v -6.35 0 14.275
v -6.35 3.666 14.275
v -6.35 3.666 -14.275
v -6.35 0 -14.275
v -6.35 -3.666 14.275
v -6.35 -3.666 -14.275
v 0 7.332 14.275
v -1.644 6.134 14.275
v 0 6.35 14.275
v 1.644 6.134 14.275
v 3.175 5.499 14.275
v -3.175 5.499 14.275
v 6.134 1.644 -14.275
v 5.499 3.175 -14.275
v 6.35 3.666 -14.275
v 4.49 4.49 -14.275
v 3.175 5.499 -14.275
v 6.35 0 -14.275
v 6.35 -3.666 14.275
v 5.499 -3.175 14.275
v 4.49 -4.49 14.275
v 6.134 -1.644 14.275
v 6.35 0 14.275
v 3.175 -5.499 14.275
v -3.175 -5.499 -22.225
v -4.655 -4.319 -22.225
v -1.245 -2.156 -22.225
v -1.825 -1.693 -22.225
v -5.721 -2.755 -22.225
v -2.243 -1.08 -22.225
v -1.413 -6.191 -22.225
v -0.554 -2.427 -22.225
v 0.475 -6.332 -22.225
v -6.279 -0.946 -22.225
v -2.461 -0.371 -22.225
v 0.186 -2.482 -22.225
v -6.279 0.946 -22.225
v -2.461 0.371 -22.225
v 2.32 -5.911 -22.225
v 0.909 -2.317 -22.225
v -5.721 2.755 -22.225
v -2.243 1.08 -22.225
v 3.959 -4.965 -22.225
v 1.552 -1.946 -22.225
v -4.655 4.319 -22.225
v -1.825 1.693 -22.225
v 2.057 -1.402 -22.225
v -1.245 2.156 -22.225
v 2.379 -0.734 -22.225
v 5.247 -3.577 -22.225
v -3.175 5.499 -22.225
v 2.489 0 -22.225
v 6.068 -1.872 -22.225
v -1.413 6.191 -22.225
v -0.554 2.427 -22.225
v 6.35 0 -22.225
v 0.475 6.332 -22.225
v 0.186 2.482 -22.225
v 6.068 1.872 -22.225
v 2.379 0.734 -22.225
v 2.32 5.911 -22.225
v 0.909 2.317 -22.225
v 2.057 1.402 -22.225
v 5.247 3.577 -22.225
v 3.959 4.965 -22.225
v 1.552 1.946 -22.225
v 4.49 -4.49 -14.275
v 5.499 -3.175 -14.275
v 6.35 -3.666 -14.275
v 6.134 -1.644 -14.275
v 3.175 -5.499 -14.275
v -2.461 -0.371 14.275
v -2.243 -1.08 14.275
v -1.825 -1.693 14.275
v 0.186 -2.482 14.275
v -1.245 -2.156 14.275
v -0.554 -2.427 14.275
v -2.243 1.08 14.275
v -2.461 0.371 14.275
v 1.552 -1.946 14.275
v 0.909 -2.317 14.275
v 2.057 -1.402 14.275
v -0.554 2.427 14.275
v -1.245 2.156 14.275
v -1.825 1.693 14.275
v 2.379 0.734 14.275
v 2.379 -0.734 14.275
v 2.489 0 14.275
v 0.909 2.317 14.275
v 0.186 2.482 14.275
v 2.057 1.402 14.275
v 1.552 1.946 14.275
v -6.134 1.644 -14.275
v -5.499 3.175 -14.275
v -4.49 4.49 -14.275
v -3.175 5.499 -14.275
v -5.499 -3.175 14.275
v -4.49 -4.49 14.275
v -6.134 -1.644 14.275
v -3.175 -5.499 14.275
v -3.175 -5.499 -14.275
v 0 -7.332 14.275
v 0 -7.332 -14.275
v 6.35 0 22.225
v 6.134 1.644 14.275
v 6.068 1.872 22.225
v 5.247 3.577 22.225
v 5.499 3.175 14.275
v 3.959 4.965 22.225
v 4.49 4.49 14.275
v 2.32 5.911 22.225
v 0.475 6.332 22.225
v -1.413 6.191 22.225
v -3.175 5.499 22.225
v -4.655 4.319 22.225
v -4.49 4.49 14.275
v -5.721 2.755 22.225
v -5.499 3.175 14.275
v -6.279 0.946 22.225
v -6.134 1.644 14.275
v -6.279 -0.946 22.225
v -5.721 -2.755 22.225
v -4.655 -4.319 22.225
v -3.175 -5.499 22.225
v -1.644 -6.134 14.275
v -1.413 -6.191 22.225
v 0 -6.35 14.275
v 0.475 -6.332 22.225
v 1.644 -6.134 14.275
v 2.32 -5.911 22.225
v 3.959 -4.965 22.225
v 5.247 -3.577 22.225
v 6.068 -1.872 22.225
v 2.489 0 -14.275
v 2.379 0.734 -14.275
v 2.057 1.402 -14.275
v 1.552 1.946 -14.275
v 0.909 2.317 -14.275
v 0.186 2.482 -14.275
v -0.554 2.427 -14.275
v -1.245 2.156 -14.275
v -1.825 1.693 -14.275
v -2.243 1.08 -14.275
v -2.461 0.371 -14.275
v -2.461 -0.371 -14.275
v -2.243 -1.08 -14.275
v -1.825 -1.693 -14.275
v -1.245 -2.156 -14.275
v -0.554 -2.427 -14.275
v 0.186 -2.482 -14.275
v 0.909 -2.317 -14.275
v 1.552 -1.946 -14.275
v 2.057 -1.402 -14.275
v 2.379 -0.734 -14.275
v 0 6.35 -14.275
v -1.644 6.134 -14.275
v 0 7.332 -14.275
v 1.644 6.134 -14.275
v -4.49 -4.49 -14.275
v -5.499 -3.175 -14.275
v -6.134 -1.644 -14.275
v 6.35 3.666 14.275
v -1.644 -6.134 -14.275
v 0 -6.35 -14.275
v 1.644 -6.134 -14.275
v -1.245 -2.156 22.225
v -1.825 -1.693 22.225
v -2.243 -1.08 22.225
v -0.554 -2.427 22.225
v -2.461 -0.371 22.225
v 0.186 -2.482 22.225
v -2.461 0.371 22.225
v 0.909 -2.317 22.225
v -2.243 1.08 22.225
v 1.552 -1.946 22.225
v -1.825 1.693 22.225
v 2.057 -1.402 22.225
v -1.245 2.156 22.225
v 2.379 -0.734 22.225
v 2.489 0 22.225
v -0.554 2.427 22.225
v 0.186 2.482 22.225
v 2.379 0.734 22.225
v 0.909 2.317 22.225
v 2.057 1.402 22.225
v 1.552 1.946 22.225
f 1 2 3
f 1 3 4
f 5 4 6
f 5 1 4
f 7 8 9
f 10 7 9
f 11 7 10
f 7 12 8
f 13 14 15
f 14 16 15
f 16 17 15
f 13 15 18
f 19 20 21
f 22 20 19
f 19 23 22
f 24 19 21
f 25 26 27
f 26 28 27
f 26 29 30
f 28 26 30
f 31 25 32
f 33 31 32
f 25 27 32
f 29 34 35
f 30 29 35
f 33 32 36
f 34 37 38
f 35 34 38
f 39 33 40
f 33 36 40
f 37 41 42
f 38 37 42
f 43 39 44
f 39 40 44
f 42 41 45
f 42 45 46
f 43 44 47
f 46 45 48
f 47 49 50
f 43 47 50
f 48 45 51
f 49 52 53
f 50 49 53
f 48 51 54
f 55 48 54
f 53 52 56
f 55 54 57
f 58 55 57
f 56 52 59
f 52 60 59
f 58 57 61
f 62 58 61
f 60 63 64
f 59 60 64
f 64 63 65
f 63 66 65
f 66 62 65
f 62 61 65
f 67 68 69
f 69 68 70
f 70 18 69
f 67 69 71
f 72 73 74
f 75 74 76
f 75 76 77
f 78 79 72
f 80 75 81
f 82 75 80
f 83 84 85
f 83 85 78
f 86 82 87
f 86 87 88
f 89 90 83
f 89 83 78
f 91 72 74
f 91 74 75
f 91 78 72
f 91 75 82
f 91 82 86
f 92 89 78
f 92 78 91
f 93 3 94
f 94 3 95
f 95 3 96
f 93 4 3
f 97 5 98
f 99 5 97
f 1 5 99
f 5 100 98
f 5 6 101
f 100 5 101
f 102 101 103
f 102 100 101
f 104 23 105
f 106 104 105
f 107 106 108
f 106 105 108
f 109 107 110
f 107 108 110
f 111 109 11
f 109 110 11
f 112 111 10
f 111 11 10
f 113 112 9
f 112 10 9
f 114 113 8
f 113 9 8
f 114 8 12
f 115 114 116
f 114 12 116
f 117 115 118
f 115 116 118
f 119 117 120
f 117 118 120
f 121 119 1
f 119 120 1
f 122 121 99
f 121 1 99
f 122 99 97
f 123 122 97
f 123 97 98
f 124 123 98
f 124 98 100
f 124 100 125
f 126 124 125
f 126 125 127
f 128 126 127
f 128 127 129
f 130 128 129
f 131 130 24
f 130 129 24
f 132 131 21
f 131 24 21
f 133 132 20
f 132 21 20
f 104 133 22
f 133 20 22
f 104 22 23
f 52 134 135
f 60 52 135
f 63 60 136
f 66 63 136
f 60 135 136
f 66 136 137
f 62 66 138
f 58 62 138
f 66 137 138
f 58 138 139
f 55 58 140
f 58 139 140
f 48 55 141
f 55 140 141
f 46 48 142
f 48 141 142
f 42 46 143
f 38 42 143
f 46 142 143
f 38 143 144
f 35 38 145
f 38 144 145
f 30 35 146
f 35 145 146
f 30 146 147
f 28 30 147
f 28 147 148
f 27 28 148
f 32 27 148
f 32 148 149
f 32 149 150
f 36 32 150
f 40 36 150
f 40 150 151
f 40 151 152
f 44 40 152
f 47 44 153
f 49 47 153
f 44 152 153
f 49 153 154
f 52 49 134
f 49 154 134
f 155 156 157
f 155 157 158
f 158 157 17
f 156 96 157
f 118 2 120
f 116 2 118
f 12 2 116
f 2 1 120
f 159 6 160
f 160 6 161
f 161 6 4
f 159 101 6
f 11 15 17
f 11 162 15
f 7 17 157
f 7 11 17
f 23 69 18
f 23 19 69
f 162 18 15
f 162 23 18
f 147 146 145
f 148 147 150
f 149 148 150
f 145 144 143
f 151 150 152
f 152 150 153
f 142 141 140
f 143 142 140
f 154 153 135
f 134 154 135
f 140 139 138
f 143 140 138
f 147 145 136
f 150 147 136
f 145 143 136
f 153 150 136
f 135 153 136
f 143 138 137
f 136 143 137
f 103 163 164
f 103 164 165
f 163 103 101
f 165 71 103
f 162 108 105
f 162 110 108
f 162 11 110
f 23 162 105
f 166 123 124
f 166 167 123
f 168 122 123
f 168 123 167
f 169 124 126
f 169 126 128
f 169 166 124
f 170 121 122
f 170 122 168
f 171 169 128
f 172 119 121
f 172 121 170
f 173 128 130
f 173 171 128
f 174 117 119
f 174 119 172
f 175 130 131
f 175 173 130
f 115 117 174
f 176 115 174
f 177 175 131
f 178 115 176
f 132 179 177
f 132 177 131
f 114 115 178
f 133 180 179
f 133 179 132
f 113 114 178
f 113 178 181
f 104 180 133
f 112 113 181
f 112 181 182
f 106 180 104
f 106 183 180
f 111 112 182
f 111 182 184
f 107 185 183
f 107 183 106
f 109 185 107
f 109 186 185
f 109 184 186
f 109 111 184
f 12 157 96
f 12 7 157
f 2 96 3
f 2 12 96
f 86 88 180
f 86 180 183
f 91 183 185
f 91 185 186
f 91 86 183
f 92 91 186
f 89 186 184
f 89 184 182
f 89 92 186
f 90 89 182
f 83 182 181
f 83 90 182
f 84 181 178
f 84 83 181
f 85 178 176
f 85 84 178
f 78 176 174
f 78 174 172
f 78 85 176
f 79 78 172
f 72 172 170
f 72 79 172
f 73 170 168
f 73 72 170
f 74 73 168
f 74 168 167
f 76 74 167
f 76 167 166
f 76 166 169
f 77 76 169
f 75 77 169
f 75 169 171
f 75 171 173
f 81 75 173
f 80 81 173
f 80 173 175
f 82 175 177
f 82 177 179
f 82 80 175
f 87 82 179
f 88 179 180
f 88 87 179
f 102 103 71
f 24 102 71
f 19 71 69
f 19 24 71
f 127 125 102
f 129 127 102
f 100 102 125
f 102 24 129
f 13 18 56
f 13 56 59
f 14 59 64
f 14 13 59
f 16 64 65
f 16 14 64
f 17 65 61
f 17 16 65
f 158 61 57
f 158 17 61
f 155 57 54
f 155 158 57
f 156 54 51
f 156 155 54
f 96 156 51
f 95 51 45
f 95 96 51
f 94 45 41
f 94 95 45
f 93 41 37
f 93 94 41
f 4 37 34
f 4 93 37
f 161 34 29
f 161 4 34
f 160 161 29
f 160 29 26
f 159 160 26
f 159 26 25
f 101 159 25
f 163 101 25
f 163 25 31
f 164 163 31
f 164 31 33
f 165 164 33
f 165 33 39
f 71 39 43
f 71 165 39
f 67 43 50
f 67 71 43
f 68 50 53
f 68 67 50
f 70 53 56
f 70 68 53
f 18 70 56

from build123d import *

# Parameters (mm, degrees)
BOSS_EXTRUDE1_DEPTH = 14.2748
SKETCH2_R           = 6.35
SKETCH2_R_2         = 2.4892
BOSS_EXTRUDE2_DEPTH = 7.9502


with BuildPart() as part:
    # Sketch1 → Boss-Extrude1 (new, symmetric)
    with BuildSketch(Plane.XY):
        Polygon((0, 7.332348419), (-6.35, 3.666174209), (-6.35, -3.666174209), (0, -7.332348419), (6.35, -3.666174209), (6.35, 3.666174209), align=None)
    extrude(amount=BOSS_EXTRUDE1_DEPTH, both=True)

    # Sketch2 → Boss-Extrude2 (add)
    with BuildSketch(Plane.XY.offset(14.2748)):
        Circle(SKETCH2_R)
        Circle(SKETCH2_R_2, mode=Mode.SUBTRACT)
    boss_extrude2 = extrude(amount=BOSS_EXTRUDE2_DEPTH)

    # Mirror1: Boss-Extrude2 across plane
    add(boss_extrude2.mirror(Plane.XY))


solid = part.part
